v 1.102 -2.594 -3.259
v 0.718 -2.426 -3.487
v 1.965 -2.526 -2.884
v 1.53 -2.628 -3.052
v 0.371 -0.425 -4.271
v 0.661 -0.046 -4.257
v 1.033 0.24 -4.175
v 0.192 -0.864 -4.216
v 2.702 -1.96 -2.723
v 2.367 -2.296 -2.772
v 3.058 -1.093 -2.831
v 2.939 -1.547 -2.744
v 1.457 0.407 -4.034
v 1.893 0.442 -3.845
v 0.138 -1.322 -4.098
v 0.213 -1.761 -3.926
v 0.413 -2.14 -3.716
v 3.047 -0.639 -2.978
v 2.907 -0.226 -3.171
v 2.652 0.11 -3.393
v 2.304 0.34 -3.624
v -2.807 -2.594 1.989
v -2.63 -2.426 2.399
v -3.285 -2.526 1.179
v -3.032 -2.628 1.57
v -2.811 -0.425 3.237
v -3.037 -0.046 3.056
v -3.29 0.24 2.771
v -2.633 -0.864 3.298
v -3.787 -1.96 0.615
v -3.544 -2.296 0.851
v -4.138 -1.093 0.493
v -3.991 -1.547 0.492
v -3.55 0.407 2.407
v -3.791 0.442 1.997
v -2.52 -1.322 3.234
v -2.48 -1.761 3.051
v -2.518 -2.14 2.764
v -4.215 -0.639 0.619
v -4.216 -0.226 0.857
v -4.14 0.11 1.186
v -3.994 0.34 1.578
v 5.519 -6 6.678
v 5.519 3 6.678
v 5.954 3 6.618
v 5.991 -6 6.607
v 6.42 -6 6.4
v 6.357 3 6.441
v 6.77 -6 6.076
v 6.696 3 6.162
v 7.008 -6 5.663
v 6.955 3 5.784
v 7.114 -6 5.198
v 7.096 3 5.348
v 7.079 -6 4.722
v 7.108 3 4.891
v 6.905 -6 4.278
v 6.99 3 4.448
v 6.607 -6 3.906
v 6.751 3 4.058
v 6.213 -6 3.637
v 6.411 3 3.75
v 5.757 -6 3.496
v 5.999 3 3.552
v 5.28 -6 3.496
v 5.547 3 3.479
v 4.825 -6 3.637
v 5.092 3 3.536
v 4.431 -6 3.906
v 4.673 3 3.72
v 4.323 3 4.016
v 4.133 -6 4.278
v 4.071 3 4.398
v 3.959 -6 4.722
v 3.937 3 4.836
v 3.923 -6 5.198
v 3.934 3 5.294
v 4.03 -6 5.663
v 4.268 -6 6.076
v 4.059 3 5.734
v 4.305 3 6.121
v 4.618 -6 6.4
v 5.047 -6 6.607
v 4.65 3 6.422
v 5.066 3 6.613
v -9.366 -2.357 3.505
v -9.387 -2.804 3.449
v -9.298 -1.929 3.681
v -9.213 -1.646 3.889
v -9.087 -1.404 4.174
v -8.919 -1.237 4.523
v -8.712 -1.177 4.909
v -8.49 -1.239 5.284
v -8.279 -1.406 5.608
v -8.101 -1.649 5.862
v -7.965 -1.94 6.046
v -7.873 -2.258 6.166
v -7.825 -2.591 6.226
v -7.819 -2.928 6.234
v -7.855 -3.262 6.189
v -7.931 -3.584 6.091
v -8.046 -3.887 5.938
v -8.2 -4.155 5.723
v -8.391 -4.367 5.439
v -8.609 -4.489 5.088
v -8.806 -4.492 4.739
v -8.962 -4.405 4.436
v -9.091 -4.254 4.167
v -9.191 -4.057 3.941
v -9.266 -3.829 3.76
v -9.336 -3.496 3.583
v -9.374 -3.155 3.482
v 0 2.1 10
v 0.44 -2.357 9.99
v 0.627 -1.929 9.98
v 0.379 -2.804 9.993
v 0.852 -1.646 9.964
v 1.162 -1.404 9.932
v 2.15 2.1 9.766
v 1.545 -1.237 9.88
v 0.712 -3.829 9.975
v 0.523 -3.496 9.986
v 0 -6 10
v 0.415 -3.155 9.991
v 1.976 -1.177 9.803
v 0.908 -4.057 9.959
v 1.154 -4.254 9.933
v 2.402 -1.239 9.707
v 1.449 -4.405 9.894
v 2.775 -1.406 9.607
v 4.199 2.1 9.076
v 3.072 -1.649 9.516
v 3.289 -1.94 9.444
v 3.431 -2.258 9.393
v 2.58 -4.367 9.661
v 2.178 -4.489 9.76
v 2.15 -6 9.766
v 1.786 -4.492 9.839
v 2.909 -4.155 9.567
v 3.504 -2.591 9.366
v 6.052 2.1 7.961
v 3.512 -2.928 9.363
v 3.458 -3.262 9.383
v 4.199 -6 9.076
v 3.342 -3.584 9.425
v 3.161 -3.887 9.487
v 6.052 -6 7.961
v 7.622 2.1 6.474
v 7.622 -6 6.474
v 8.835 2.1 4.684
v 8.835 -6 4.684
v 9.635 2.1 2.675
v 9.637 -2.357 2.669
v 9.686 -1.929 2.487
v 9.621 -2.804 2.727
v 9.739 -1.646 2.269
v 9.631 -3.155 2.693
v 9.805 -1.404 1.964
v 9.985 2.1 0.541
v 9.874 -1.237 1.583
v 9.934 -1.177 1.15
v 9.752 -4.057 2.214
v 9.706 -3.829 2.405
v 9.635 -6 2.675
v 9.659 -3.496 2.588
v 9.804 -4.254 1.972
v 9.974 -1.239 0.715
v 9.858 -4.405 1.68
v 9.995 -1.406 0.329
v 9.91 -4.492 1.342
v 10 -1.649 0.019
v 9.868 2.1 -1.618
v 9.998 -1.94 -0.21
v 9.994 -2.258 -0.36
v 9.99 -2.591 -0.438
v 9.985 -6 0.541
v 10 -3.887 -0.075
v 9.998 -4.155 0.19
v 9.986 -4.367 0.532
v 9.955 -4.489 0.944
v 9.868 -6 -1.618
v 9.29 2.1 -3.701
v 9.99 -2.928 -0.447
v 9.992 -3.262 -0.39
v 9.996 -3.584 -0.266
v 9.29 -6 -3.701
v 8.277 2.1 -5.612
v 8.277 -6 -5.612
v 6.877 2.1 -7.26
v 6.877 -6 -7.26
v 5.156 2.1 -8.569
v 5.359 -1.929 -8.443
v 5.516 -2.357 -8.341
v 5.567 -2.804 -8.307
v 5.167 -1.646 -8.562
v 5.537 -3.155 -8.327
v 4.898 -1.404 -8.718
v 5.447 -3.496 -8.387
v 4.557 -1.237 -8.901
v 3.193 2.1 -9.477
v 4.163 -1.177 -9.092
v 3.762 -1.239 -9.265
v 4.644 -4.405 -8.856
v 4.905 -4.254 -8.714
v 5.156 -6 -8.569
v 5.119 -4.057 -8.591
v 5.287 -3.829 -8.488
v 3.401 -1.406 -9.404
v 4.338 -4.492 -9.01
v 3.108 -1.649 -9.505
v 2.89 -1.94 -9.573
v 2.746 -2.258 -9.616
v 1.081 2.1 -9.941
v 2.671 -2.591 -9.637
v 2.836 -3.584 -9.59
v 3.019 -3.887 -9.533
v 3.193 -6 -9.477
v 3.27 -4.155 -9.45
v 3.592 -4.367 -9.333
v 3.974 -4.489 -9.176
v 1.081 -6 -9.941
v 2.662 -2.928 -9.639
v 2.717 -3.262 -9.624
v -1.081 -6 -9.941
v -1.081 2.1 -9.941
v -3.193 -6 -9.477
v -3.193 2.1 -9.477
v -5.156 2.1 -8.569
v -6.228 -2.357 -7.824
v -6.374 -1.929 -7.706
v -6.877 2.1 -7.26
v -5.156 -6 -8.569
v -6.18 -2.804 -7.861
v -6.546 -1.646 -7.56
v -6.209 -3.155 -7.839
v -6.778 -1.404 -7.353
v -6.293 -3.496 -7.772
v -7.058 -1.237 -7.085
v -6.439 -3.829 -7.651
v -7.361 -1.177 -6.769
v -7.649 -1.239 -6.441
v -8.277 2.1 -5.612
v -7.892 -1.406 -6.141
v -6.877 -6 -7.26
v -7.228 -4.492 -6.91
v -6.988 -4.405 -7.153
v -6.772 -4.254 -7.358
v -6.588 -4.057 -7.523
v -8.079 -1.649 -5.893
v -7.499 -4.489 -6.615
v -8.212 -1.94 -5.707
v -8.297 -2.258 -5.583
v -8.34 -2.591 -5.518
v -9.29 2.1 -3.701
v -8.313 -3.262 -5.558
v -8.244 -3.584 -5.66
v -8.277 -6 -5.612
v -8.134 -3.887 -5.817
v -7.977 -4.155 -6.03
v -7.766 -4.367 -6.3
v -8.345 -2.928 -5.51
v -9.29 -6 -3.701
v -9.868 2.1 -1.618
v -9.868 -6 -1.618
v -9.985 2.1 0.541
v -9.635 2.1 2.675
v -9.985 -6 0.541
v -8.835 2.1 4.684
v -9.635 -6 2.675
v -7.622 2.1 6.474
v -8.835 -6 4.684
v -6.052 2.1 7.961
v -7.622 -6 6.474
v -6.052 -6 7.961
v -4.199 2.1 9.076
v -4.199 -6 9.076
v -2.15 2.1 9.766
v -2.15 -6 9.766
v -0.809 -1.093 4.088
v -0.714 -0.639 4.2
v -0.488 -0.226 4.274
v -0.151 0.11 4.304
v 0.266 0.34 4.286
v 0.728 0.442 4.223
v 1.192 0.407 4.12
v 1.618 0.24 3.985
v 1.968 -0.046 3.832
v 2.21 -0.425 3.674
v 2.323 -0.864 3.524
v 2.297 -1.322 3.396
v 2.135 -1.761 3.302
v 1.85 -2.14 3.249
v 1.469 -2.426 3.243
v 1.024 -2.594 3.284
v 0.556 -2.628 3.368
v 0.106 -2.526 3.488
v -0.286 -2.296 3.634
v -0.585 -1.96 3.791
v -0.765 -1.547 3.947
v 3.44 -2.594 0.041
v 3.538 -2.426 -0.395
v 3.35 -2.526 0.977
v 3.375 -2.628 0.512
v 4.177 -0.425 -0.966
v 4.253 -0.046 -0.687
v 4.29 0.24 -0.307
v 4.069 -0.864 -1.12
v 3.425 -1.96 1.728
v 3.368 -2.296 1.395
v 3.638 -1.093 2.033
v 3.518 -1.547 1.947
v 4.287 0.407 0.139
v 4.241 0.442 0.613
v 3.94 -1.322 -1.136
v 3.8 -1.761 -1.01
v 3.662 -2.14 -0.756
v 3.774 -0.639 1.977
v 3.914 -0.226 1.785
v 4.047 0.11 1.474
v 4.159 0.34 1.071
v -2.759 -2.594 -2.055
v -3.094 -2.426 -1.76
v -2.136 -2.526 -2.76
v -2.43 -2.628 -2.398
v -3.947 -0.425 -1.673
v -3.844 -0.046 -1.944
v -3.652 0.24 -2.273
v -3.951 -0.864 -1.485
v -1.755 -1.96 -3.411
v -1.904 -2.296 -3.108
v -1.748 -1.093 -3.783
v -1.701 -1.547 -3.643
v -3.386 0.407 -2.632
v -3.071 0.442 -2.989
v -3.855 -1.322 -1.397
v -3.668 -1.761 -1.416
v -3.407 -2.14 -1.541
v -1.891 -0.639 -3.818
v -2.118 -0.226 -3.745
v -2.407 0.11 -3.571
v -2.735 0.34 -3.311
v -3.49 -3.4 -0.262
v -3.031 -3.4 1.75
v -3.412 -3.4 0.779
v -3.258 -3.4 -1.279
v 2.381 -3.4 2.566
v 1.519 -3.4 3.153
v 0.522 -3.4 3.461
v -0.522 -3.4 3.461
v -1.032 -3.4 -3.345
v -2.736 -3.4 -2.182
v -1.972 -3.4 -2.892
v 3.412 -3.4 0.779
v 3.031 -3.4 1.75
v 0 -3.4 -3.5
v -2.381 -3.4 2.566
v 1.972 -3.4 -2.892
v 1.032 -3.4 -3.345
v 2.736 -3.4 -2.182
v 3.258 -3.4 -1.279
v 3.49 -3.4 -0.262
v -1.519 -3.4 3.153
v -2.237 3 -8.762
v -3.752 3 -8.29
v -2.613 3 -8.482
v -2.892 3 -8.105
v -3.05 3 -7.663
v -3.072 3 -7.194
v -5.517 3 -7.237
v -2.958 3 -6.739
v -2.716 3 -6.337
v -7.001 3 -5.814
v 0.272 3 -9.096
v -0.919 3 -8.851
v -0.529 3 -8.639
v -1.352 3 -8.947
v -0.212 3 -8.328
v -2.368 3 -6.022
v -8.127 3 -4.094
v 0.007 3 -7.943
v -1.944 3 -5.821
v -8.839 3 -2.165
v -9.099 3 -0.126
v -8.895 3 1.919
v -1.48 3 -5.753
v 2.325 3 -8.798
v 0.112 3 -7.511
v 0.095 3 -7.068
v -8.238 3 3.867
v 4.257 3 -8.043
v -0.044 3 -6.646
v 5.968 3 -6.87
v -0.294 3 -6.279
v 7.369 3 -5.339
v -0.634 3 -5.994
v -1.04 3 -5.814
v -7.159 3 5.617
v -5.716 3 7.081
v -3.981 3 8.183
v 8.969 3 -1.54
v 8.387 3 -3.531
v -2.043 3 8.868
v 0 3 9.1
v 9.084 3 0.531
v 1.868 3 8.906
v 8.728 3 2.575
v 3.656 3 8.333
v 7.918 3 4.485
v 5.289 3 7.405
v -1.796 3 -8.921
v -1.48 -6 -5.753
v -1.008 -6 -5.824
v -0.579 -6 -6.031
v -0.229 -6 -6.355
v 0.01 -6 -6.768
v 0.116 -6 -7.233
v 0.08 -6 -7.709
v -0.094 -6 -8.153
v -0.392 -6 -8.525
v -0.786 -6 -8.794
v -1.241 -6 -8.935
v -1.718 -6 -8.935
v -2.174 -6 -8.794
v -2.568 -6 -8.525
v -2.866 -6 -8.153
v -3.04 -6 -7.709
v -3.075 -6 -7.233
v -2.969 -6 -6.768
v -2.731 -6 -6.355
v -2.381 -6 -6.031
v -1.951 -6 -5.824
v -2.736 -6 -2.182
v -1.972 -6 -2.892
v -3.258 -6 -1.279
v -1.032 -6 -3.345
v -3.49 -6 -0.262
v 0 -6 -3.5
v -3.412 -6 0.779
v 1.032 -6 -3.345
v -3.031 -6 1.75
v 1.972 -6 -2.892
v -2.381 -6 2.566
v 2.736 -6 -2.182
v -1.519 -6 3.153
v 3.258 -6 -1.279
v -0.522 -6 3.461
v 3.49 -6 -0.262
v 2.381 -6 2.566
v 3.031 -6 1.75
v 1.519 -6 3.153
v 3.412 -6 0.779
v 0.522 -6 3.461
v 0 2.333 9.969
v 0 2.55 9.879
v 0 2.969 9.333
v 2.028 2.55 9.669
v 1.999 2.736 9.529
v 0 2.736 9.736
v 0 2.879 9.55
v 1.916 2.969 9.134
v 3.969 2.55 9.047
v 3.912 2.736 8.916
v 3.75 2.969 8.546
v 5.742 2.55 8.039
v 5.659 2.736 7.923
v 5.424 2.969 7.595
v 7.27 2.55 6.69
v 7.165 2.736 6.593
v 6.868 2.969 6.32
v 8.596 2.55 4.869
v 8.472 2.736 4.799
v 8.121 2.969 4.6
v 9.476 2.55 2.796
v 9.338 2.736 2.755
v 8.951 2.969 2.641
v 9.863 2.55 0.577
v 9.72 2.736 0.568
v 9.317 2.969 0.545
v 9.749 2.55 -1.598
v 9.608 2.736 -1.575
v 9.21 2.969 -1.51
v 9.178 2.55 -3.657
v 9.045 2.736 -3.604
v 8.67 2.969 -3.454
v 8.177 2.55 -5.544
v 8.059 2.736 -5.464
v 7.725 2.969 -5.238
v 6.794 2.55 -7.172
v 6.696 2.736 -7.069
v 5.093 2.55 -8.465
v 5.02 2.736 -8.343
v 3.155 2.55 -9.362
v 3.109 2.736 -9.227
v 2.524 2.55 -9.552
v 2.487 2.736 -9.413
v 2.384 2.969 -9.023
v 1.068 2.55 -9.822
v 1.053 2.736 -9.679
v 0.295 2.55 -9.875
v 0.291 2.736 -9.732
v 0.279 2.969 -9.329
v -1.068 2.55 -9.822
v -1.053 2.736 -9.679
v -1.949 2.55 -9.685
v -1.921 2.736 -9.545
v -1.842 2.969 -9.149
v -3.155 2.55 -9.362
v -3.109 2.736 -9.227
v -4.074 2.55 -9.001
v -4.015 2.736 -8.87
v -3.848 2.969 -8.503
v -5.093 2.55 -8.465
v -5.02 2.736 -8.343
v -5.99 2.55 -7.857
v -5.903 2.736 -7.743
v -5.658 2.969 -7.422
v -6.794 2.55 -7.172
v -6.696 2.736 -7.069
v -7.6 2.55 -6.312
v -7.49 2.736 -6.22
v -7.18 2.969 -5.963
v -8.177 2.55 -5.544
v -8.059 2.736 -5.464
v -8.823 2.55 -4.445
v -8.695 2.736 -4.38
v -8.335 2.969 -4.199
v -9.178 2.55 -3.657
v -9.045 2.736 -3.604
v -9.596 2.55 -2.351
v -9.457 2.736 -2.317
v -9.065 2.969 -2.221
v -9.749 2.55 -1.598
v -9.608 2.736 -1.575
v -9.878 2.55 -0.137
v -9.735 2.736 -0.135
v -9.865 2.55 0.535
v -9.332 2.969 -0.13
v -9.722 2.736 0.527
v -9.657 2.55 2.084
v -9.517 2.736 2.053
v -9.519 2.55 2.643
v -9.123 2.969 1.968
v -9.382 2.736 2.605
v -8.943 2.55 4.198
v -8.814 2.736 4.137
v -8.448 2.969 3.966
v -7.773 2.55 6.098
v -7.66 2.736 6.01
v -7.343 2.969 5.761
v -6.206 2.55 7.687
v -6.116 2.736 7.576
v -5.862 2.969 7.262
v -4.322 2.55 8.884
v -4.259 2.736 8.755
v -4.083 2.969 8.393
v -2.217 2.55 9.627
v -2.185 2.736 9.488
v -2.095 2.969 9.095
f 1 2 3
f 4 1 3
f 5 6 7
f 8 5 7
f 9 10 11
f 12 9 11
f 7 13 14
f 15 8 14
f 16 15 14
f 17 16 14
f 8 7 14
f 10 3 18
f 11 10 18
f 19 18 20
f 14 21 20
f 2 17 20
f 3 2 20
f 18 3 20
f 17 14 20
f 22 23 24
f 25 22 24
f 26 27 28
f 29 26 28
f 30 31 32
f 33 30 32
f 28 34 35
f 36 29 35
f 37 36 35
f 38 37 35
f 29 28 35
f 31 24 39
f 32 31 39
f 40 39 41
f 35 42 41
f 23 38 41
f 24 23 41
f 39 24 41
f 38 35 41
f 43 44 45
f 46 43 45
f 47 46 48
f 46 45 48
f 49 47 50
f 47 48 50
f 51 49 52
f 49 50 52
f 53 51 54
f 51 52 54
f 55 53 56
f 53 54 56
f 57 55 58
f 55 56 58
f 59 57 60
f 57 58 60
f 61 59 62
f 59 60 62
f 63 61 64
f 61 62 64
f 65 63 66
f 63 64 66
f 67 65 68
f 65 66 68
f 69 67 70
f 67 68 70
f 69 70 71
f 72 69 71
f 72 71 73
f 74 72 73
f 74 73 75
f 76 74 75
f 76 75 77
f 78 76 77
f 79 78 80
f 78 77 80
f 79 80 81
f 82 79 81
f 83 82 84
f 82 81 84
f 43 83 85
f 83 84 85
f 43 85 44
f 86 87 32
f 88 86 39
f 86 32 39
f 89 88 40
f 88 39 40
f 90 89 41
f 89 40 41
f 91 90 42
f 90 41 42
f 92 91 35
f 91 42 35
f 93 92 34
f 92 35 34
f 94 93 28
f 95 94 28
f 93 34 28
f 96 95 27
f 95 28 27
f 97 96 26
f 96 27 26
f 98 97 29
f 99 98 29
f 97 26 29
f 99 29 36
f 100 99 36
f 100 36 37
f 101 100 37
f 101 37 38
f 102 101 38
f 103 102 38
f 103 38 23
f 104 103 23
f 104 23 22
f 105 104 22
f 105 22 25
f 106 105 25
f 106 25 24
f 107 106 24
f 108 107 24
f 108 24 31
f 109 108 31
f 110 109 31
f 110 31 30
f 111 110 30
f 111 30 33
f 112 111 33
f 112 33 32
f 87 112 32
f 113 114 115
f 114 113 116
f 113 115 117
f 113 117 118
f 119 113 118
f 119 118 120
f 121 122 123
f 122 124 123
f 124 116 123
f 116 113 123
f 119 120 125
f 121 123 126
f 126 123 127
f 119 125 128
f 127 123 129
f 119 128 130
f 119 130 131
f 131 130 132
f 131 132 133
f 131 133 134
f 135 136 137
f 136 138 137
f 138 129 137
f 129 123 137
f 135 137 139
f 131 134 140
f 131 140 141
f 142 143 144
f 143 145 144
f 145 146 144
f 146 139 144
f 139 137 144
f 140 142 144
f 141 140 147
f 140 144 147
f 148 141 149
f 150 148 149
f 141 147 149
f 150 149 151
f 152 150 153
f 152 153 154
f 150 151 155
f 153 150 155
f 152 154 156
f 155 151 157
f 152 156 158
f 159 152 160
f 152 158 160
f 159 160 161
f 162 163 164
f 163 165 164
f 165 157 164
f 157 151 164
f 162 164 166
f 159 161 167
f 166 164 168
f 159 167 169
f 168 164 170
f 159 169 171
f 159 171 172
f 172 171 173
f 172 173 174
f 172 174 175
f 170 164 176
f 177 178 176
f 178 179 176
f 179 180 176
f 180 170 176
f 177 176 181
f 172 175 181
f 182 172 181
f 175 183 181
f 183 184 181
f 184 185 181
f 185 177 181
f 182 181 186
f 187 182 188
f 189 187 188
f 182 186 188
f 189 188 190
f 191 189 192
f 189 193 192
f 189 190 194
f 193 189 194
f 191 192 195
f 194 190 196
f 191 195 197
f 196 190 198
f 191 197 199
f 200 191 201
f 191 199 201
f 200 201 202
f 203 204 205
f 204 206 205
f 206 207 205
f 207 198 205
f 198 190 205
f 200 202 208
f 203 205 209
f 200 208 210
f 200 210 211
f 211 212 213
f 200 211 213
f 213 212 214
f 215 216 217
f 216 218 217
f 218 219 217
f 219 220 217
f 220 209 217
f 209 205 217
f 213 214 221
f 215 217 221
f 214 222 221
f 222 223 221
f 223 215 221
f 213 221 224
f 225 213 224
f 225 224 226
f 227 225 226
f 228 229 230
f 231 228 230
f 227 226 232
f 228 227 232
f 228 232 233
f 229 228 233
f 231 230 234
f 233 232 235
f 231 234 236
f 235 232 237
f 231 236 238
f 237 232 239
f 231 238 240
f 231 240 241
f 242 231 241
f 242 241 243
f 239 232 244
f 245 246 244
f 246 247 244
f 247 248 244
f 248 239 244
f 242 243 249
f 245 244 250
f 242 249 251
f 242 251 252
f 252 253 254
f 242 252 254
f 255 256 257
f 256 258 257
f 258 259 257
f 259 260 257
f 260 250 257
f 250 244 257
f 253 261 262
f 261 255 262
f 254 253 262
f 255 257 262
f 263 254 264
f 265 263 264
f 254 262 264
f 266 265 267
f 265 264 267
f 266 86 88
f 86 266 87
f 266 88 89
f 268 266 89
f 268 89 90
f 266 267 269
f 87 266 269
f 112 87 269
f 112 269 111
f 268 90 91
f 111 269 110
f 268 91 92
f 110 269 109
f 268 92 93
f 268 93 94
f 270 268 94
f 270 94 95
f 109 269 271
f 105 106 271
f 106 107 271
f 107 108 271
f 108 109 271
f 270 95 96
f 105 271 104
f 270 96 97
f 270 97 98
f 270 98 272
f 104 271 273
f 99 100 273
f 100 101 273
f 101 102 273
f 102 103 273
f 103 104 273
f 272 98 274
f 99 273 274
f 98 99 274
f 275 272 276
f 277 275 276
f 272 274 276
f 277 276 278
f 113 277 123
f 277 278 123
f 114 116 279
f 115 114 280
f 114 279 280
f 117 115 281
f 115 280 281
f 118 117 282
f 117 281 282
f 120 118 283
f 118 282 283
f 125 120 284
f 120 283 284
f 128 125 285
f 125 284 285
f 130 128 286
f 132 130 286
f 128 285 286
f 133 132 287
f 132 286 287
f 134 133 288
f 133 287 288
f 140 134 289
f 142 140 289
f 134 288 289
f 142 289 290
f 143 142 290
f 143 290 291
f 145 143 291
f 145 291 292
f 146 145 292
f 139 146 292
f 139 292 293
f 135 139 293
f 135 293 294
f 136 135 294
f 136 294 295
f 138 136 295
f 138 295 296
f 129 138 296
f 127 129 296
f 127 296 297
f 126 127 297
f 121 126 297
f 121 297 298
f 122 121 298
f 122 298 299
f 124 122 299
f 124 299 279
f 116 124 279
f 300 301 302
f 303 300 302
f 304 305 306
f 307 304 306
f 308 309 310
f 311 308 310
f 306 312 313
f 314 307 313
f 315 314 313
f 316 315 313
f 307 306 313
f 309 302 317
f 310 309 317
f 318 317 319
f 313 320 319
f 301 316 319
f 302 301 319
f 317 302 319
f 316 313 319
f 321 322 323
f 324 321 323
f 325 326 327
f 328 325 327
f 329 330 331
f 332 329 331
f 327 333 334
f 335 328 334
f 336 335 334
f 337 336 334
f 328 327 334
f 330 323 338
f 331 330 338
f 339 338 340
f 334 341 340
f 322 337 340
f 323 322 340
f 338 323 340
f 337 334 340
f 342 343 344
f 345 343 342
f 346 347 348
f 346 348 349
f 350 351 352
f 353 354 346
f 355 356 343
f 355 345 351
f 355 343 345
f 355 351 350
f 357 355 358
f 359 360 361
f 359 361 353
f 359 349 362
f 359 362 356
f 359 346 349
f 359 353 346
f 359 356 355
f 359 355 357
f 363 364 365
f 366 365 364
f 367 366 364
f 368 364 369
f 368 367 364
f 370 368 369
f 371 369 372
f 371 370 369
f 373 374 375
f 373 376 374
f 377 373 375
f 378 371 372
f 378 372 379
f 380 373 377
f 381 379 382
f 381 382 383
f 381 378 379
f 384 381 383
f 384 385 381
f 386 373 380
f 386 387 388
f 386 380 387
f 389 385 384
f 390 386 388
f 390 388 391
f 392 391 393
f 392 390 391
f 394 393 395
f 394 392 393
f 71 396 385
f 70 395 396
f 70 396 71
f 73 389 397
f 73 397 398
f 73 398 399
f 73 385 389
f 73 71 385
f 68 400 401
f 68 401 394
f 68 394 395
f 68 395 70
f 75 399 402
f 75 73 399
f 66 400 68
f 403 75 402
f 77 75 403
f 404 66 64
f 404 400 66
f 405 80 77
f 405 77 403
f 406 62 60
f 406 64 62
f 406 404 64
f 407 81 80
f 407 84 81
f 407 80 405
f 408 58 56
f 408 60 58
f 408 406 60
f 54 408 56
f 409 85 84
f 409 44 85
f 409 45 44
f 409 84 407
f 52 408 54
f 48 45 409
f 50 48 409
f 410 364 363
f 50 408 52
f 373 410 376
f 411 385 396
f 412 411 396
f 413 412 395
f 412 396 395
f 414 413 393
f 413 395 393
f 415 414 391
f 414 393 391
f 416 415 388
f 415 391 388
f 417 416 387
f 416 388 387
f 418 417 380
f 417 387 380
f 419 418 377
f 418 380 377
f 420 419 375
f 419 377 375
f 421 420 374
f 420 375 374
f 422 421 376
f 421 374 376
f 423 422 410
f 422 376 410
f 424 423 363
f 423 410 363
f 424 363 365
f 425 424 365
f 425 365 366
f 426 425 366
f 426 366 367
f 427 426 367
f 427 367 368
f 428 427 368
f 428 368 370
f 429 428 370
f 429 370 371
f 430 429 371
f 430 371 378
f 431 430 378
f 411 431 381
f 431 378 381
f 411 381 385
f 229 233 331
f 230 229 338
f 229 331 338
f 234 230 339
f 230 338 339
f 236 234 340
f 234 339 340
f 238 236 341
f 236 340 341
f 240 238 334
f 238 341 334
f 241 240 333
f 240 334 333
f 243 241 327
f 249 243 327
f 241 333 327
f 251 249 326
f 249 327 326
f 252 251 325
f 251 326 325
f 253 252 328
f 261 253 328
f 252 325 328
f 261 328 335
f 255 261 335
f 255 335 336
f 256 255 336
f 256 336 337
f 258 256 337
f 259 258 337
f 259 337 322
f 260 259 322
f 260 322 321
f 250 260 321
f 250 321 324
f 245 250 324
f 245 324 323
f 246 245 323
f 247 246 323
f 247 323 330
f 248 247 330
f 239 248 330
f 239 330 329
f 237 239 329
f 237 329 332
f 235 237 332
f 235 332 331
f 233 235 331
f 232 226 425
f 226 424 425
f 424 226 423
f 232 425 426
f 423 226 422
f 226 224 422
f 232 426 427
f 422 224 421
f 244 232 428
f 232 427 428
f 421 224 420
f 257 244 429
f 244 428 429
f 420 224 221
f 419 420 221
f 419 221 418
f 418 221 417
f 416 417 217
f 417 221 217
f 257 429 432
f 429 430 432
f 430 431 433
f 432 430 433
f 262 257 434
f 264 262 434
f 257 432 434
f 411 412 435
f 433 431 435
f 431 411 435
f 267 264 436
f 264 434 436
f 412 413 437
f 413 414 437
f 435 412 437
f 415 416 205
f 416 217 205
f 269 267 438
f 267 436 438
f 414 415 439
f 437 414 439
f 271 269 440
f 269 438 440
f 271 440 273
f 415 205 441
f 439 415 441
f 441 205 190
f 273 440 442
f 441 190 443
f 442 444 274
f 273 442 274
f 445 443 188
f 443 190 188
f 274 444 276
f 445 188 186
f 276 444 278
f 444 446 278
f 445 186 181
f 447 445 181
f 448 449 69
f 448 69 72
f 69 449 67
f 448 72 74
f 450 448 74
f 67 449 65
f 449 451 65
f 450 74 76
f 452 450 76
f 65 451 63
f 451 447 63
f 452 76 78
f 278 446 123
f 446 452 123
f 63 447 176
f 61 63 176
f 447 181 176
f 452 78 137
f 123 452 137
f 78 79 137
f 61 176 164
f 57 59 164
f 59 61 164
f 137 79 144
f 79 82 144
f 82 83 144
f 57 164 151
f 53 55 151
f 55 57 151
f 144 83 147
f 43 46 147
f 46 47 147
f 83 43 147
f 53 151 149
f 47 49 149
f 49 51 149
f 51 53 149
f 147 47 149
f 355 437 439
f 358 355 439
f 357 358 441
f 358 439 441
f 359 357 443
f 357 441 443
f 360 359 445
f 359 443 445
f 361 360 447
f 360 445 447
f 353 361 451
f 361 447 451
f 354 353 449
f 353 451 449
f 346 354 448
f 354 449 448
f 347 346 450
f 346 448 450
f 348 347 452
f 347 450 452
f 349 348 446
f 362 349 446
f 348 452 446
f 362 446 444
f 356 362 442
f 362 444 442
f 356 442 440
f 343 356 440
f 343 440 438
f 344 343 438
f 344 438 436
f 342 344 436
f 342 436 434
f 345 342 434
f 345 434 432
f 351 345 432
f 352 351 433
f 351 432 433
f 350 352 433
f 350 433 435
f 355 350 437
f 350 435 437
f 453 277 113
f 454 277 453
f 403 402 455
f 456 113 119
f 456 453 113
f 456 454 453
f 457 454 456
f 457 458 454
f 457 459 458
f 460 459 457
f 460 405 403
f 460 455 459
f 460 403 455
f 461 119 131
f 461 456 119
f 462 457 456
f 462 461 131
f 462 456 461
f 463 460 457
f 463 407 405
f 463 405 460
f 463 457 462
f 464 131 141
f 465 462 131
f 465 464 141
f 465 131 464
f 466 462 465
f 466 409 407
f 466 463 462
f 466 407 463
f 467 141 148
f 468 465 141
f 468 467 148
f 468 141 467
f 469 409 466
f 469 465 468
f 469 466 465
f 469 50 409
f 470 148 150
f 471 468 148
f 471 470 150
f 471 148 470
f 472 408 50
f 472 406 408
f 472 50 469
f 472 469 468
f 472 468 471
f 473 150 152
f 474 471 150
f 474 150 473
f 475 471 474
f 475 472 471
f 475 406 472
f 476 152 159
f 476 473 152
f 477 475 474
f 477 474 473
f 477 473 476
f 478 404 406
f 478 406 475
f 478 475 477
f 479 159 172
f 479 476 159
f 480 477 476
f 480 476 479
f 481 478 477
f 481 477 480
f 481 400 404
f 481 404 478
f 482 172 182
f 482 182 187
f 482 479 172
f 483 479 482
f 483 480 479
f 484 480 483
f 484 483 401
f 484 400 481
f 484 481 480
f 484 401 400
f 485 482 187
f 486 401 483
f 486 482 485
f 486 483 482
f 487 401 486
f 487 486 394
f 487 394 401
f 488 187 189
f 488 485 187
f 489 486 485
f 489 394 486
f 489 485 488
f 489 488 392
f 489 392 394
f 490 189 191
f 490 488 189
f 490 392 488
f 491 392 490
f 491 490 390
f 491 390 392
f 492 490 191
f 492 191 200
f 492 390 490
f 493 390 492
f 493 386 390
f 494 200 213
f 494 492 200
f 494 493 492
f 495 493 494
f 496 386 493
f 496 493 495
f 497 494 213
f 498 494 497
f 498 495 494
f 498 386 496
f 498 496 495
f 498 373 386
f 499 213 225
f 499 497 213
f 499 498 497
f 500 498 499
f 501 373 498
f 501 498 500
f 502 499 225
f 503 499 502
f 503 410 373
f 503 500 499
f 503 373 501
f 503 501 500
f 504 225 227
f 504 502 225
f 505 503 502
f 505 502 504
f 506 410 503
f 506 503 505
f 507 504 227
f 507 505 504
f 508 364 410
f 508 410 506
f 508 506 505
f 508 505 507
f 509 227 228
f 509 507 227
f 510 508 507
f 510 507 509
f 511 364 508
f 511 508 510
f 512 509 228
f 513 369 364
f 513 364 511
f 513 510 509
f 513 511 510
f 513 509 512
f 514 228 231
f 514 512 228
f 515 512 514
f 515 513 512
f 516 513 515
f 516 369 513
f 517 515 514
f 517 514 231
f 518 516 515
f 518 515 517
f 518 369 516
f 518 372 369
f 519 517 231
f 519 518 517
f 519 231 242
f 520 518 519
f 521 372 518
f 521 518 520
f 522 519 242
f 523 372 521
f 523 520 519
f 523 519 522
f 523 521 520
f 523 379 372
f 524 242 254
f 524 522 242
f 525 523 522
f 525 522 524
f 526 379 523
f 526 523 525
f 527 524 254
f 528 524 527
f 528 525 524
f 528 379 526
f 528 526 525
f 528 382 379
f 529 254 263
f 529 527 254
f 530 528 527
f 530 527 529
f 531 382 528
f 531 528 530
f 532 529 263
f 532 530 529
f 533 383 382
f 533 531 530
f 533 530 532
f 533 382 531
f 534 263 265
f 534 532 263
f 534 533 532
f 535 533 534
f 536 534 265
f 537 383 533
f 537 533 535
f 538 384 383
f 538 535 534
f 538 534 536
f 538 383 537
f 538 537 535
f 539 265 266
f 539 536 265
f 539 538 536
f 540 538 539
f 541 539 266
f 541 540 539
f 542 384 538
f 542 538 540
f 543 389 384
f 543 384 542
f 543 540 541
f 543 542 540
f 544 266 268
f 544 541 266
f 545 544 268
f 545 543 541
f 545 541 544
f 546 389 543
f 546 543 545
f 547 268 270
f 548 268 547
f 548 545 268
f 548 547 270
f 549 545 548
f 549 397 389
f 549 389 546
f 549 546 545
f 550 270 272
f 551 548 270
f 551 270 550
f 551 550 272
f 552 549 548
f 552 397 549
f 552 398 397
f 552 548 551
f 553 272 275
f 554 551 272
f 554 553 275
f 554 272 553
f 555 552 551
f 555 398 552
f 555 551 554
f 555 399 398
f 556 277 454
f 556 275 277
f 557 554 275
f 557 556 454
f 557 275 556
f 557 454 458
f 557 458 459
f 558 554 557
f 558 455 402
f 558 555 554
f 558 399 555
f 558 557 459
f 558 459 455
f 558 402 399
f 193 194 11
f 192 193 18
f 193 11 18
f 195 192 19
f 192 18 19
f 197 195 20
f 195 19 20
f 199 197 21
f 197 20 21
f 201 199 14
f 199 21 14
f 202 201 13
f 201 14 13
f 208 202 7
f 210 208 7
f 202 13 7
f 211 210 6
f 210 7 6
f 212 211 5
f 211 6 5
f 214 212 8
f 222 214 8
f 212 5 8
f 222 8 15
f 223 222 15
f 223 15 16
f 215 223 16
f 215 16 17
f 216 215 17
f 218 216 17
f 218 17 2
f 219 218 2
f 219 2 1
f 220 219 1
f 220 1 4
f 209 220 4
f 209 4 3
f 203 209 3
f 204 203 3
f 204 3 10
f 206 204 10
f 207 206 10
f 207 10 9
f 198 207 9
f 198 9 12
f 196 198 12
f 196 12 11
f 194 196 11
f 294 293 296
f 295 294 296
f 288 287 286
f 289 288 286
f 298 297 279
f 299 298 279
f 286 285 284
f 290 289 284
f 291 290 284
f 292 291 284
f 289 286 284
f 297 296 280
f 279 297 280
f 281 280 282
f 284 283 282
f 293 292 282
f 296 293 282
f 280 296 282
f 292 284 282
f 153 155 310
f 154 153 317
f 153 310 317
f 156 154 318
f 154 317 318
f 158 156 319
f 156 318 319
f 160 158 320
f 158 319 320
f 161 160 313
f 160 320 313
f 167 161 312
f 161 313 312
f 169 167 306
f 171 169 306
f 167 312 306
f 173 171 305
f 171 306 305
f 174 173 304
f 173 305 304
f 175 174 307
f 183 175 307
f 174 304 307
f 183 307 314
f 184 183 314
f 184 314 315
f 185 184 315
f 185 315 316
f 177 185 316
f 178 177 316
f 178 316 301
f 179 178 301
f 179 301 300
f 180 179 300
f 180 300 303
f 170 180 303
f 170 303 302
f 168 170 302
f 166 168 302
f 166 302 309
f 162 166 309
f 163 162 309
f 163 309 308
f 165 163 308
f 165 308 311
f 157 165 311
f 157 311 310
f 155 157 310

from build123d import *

# Parameters (mm, degrees)
BOSS_EXTRUDE1_DEPTH      = 3
BOSS_EXTRUDE1_DEPTH_BACK = 6
SKETCH1_R                = 10
SKETCH4_R                = 1.6
HOLE_DEPTH               = 19.539009706
HOLECIR_COUNT            = 5
FILLET3_R                = 0.9
SKETCH5_R                = 3.5
CUT_EXTRUDE1_DEPTH       = 2.6
SKETCH6_R                = 1.6
CUT_EXTRUDE2_DEPTH       = 17.763054787


with BuildPart() as part:
    # Sketch1 → Boss-Extrude1 (new, two sides: drawn at the far end of the back side and taken through both)
    with BuildSketch(Plane(origin=(0, 0, 0), x_dir=(1, 0, 0), z_dir=(0, 1, 0)).offset(-BOSS_EXTRUDE1_DEPTH_BACK)):
        Circle(SKETCH1_R)
    extrude(amount=BOSS_EXTRUDE1_DEPTH + BOSS_EXTRUDE1_DEPTH_BACK)

    # Sketch4 → hole (cut, through all)
    with BuildSketch(Plane(origin=(-3.352872105, -1.093066116, 1.887711608), x_dir=(-0.4486862613641547, -0.14627571033740308, -0.8816371449912632), z_dir=(0.8382180262940947, 0.2732665289126682, -0.47192790187872385))):
        Circle(SKETCH4_R)
    hole = extrude(amount=-HOLE_DEPTH, mode=Mode.SUBTRACT)

    # holecir: hole ×5 about axis
    holecir_axis = Axis((0, 5.5, 0), (0, -1, 0))
    for i in range(1, HOLECIR_COUNT):
        add(hole.rotate(holecir_axis, i * 360 / HOLECIR_COUNT), mode=Mode.SUBTRACT)

    # Fillet3
    fillet3_edges = [part.edges().sort_by_distance(p)[0] for p in [
        (-10, 3, 0),
    ]]
    fillet(fillet3_edges, radius=FILLET3_R)

    # Sketch5 → Cut-Extrude1 (cut)
    with BuildSketch(Plane.XZ.offset(6)):
        Circle(SKETCH5_R)
    extrude(amount=-CUT_EXTRUDE1_DEPTH, mode=Mode.SUBTRACT)

    # Sketch6 → Cut-Extrude2 (cut, through all)
    with BuildSketch(Plane(origin=(0, 3, 0), x_dir=(1, 0, 0), z_dir=(0, 1, 0))):
        with Locations((-1.479875163, 7.352548504)):
            Circle(SKETCH6_R)
        with Locations((5.518963734, -5.078487896)):
            Circle(SKETCH6_R)
    extrude(amount=-CUT_EXTRUDE2_DEPTH, mode=Mode.SUBTRACT)


solid = part.part
